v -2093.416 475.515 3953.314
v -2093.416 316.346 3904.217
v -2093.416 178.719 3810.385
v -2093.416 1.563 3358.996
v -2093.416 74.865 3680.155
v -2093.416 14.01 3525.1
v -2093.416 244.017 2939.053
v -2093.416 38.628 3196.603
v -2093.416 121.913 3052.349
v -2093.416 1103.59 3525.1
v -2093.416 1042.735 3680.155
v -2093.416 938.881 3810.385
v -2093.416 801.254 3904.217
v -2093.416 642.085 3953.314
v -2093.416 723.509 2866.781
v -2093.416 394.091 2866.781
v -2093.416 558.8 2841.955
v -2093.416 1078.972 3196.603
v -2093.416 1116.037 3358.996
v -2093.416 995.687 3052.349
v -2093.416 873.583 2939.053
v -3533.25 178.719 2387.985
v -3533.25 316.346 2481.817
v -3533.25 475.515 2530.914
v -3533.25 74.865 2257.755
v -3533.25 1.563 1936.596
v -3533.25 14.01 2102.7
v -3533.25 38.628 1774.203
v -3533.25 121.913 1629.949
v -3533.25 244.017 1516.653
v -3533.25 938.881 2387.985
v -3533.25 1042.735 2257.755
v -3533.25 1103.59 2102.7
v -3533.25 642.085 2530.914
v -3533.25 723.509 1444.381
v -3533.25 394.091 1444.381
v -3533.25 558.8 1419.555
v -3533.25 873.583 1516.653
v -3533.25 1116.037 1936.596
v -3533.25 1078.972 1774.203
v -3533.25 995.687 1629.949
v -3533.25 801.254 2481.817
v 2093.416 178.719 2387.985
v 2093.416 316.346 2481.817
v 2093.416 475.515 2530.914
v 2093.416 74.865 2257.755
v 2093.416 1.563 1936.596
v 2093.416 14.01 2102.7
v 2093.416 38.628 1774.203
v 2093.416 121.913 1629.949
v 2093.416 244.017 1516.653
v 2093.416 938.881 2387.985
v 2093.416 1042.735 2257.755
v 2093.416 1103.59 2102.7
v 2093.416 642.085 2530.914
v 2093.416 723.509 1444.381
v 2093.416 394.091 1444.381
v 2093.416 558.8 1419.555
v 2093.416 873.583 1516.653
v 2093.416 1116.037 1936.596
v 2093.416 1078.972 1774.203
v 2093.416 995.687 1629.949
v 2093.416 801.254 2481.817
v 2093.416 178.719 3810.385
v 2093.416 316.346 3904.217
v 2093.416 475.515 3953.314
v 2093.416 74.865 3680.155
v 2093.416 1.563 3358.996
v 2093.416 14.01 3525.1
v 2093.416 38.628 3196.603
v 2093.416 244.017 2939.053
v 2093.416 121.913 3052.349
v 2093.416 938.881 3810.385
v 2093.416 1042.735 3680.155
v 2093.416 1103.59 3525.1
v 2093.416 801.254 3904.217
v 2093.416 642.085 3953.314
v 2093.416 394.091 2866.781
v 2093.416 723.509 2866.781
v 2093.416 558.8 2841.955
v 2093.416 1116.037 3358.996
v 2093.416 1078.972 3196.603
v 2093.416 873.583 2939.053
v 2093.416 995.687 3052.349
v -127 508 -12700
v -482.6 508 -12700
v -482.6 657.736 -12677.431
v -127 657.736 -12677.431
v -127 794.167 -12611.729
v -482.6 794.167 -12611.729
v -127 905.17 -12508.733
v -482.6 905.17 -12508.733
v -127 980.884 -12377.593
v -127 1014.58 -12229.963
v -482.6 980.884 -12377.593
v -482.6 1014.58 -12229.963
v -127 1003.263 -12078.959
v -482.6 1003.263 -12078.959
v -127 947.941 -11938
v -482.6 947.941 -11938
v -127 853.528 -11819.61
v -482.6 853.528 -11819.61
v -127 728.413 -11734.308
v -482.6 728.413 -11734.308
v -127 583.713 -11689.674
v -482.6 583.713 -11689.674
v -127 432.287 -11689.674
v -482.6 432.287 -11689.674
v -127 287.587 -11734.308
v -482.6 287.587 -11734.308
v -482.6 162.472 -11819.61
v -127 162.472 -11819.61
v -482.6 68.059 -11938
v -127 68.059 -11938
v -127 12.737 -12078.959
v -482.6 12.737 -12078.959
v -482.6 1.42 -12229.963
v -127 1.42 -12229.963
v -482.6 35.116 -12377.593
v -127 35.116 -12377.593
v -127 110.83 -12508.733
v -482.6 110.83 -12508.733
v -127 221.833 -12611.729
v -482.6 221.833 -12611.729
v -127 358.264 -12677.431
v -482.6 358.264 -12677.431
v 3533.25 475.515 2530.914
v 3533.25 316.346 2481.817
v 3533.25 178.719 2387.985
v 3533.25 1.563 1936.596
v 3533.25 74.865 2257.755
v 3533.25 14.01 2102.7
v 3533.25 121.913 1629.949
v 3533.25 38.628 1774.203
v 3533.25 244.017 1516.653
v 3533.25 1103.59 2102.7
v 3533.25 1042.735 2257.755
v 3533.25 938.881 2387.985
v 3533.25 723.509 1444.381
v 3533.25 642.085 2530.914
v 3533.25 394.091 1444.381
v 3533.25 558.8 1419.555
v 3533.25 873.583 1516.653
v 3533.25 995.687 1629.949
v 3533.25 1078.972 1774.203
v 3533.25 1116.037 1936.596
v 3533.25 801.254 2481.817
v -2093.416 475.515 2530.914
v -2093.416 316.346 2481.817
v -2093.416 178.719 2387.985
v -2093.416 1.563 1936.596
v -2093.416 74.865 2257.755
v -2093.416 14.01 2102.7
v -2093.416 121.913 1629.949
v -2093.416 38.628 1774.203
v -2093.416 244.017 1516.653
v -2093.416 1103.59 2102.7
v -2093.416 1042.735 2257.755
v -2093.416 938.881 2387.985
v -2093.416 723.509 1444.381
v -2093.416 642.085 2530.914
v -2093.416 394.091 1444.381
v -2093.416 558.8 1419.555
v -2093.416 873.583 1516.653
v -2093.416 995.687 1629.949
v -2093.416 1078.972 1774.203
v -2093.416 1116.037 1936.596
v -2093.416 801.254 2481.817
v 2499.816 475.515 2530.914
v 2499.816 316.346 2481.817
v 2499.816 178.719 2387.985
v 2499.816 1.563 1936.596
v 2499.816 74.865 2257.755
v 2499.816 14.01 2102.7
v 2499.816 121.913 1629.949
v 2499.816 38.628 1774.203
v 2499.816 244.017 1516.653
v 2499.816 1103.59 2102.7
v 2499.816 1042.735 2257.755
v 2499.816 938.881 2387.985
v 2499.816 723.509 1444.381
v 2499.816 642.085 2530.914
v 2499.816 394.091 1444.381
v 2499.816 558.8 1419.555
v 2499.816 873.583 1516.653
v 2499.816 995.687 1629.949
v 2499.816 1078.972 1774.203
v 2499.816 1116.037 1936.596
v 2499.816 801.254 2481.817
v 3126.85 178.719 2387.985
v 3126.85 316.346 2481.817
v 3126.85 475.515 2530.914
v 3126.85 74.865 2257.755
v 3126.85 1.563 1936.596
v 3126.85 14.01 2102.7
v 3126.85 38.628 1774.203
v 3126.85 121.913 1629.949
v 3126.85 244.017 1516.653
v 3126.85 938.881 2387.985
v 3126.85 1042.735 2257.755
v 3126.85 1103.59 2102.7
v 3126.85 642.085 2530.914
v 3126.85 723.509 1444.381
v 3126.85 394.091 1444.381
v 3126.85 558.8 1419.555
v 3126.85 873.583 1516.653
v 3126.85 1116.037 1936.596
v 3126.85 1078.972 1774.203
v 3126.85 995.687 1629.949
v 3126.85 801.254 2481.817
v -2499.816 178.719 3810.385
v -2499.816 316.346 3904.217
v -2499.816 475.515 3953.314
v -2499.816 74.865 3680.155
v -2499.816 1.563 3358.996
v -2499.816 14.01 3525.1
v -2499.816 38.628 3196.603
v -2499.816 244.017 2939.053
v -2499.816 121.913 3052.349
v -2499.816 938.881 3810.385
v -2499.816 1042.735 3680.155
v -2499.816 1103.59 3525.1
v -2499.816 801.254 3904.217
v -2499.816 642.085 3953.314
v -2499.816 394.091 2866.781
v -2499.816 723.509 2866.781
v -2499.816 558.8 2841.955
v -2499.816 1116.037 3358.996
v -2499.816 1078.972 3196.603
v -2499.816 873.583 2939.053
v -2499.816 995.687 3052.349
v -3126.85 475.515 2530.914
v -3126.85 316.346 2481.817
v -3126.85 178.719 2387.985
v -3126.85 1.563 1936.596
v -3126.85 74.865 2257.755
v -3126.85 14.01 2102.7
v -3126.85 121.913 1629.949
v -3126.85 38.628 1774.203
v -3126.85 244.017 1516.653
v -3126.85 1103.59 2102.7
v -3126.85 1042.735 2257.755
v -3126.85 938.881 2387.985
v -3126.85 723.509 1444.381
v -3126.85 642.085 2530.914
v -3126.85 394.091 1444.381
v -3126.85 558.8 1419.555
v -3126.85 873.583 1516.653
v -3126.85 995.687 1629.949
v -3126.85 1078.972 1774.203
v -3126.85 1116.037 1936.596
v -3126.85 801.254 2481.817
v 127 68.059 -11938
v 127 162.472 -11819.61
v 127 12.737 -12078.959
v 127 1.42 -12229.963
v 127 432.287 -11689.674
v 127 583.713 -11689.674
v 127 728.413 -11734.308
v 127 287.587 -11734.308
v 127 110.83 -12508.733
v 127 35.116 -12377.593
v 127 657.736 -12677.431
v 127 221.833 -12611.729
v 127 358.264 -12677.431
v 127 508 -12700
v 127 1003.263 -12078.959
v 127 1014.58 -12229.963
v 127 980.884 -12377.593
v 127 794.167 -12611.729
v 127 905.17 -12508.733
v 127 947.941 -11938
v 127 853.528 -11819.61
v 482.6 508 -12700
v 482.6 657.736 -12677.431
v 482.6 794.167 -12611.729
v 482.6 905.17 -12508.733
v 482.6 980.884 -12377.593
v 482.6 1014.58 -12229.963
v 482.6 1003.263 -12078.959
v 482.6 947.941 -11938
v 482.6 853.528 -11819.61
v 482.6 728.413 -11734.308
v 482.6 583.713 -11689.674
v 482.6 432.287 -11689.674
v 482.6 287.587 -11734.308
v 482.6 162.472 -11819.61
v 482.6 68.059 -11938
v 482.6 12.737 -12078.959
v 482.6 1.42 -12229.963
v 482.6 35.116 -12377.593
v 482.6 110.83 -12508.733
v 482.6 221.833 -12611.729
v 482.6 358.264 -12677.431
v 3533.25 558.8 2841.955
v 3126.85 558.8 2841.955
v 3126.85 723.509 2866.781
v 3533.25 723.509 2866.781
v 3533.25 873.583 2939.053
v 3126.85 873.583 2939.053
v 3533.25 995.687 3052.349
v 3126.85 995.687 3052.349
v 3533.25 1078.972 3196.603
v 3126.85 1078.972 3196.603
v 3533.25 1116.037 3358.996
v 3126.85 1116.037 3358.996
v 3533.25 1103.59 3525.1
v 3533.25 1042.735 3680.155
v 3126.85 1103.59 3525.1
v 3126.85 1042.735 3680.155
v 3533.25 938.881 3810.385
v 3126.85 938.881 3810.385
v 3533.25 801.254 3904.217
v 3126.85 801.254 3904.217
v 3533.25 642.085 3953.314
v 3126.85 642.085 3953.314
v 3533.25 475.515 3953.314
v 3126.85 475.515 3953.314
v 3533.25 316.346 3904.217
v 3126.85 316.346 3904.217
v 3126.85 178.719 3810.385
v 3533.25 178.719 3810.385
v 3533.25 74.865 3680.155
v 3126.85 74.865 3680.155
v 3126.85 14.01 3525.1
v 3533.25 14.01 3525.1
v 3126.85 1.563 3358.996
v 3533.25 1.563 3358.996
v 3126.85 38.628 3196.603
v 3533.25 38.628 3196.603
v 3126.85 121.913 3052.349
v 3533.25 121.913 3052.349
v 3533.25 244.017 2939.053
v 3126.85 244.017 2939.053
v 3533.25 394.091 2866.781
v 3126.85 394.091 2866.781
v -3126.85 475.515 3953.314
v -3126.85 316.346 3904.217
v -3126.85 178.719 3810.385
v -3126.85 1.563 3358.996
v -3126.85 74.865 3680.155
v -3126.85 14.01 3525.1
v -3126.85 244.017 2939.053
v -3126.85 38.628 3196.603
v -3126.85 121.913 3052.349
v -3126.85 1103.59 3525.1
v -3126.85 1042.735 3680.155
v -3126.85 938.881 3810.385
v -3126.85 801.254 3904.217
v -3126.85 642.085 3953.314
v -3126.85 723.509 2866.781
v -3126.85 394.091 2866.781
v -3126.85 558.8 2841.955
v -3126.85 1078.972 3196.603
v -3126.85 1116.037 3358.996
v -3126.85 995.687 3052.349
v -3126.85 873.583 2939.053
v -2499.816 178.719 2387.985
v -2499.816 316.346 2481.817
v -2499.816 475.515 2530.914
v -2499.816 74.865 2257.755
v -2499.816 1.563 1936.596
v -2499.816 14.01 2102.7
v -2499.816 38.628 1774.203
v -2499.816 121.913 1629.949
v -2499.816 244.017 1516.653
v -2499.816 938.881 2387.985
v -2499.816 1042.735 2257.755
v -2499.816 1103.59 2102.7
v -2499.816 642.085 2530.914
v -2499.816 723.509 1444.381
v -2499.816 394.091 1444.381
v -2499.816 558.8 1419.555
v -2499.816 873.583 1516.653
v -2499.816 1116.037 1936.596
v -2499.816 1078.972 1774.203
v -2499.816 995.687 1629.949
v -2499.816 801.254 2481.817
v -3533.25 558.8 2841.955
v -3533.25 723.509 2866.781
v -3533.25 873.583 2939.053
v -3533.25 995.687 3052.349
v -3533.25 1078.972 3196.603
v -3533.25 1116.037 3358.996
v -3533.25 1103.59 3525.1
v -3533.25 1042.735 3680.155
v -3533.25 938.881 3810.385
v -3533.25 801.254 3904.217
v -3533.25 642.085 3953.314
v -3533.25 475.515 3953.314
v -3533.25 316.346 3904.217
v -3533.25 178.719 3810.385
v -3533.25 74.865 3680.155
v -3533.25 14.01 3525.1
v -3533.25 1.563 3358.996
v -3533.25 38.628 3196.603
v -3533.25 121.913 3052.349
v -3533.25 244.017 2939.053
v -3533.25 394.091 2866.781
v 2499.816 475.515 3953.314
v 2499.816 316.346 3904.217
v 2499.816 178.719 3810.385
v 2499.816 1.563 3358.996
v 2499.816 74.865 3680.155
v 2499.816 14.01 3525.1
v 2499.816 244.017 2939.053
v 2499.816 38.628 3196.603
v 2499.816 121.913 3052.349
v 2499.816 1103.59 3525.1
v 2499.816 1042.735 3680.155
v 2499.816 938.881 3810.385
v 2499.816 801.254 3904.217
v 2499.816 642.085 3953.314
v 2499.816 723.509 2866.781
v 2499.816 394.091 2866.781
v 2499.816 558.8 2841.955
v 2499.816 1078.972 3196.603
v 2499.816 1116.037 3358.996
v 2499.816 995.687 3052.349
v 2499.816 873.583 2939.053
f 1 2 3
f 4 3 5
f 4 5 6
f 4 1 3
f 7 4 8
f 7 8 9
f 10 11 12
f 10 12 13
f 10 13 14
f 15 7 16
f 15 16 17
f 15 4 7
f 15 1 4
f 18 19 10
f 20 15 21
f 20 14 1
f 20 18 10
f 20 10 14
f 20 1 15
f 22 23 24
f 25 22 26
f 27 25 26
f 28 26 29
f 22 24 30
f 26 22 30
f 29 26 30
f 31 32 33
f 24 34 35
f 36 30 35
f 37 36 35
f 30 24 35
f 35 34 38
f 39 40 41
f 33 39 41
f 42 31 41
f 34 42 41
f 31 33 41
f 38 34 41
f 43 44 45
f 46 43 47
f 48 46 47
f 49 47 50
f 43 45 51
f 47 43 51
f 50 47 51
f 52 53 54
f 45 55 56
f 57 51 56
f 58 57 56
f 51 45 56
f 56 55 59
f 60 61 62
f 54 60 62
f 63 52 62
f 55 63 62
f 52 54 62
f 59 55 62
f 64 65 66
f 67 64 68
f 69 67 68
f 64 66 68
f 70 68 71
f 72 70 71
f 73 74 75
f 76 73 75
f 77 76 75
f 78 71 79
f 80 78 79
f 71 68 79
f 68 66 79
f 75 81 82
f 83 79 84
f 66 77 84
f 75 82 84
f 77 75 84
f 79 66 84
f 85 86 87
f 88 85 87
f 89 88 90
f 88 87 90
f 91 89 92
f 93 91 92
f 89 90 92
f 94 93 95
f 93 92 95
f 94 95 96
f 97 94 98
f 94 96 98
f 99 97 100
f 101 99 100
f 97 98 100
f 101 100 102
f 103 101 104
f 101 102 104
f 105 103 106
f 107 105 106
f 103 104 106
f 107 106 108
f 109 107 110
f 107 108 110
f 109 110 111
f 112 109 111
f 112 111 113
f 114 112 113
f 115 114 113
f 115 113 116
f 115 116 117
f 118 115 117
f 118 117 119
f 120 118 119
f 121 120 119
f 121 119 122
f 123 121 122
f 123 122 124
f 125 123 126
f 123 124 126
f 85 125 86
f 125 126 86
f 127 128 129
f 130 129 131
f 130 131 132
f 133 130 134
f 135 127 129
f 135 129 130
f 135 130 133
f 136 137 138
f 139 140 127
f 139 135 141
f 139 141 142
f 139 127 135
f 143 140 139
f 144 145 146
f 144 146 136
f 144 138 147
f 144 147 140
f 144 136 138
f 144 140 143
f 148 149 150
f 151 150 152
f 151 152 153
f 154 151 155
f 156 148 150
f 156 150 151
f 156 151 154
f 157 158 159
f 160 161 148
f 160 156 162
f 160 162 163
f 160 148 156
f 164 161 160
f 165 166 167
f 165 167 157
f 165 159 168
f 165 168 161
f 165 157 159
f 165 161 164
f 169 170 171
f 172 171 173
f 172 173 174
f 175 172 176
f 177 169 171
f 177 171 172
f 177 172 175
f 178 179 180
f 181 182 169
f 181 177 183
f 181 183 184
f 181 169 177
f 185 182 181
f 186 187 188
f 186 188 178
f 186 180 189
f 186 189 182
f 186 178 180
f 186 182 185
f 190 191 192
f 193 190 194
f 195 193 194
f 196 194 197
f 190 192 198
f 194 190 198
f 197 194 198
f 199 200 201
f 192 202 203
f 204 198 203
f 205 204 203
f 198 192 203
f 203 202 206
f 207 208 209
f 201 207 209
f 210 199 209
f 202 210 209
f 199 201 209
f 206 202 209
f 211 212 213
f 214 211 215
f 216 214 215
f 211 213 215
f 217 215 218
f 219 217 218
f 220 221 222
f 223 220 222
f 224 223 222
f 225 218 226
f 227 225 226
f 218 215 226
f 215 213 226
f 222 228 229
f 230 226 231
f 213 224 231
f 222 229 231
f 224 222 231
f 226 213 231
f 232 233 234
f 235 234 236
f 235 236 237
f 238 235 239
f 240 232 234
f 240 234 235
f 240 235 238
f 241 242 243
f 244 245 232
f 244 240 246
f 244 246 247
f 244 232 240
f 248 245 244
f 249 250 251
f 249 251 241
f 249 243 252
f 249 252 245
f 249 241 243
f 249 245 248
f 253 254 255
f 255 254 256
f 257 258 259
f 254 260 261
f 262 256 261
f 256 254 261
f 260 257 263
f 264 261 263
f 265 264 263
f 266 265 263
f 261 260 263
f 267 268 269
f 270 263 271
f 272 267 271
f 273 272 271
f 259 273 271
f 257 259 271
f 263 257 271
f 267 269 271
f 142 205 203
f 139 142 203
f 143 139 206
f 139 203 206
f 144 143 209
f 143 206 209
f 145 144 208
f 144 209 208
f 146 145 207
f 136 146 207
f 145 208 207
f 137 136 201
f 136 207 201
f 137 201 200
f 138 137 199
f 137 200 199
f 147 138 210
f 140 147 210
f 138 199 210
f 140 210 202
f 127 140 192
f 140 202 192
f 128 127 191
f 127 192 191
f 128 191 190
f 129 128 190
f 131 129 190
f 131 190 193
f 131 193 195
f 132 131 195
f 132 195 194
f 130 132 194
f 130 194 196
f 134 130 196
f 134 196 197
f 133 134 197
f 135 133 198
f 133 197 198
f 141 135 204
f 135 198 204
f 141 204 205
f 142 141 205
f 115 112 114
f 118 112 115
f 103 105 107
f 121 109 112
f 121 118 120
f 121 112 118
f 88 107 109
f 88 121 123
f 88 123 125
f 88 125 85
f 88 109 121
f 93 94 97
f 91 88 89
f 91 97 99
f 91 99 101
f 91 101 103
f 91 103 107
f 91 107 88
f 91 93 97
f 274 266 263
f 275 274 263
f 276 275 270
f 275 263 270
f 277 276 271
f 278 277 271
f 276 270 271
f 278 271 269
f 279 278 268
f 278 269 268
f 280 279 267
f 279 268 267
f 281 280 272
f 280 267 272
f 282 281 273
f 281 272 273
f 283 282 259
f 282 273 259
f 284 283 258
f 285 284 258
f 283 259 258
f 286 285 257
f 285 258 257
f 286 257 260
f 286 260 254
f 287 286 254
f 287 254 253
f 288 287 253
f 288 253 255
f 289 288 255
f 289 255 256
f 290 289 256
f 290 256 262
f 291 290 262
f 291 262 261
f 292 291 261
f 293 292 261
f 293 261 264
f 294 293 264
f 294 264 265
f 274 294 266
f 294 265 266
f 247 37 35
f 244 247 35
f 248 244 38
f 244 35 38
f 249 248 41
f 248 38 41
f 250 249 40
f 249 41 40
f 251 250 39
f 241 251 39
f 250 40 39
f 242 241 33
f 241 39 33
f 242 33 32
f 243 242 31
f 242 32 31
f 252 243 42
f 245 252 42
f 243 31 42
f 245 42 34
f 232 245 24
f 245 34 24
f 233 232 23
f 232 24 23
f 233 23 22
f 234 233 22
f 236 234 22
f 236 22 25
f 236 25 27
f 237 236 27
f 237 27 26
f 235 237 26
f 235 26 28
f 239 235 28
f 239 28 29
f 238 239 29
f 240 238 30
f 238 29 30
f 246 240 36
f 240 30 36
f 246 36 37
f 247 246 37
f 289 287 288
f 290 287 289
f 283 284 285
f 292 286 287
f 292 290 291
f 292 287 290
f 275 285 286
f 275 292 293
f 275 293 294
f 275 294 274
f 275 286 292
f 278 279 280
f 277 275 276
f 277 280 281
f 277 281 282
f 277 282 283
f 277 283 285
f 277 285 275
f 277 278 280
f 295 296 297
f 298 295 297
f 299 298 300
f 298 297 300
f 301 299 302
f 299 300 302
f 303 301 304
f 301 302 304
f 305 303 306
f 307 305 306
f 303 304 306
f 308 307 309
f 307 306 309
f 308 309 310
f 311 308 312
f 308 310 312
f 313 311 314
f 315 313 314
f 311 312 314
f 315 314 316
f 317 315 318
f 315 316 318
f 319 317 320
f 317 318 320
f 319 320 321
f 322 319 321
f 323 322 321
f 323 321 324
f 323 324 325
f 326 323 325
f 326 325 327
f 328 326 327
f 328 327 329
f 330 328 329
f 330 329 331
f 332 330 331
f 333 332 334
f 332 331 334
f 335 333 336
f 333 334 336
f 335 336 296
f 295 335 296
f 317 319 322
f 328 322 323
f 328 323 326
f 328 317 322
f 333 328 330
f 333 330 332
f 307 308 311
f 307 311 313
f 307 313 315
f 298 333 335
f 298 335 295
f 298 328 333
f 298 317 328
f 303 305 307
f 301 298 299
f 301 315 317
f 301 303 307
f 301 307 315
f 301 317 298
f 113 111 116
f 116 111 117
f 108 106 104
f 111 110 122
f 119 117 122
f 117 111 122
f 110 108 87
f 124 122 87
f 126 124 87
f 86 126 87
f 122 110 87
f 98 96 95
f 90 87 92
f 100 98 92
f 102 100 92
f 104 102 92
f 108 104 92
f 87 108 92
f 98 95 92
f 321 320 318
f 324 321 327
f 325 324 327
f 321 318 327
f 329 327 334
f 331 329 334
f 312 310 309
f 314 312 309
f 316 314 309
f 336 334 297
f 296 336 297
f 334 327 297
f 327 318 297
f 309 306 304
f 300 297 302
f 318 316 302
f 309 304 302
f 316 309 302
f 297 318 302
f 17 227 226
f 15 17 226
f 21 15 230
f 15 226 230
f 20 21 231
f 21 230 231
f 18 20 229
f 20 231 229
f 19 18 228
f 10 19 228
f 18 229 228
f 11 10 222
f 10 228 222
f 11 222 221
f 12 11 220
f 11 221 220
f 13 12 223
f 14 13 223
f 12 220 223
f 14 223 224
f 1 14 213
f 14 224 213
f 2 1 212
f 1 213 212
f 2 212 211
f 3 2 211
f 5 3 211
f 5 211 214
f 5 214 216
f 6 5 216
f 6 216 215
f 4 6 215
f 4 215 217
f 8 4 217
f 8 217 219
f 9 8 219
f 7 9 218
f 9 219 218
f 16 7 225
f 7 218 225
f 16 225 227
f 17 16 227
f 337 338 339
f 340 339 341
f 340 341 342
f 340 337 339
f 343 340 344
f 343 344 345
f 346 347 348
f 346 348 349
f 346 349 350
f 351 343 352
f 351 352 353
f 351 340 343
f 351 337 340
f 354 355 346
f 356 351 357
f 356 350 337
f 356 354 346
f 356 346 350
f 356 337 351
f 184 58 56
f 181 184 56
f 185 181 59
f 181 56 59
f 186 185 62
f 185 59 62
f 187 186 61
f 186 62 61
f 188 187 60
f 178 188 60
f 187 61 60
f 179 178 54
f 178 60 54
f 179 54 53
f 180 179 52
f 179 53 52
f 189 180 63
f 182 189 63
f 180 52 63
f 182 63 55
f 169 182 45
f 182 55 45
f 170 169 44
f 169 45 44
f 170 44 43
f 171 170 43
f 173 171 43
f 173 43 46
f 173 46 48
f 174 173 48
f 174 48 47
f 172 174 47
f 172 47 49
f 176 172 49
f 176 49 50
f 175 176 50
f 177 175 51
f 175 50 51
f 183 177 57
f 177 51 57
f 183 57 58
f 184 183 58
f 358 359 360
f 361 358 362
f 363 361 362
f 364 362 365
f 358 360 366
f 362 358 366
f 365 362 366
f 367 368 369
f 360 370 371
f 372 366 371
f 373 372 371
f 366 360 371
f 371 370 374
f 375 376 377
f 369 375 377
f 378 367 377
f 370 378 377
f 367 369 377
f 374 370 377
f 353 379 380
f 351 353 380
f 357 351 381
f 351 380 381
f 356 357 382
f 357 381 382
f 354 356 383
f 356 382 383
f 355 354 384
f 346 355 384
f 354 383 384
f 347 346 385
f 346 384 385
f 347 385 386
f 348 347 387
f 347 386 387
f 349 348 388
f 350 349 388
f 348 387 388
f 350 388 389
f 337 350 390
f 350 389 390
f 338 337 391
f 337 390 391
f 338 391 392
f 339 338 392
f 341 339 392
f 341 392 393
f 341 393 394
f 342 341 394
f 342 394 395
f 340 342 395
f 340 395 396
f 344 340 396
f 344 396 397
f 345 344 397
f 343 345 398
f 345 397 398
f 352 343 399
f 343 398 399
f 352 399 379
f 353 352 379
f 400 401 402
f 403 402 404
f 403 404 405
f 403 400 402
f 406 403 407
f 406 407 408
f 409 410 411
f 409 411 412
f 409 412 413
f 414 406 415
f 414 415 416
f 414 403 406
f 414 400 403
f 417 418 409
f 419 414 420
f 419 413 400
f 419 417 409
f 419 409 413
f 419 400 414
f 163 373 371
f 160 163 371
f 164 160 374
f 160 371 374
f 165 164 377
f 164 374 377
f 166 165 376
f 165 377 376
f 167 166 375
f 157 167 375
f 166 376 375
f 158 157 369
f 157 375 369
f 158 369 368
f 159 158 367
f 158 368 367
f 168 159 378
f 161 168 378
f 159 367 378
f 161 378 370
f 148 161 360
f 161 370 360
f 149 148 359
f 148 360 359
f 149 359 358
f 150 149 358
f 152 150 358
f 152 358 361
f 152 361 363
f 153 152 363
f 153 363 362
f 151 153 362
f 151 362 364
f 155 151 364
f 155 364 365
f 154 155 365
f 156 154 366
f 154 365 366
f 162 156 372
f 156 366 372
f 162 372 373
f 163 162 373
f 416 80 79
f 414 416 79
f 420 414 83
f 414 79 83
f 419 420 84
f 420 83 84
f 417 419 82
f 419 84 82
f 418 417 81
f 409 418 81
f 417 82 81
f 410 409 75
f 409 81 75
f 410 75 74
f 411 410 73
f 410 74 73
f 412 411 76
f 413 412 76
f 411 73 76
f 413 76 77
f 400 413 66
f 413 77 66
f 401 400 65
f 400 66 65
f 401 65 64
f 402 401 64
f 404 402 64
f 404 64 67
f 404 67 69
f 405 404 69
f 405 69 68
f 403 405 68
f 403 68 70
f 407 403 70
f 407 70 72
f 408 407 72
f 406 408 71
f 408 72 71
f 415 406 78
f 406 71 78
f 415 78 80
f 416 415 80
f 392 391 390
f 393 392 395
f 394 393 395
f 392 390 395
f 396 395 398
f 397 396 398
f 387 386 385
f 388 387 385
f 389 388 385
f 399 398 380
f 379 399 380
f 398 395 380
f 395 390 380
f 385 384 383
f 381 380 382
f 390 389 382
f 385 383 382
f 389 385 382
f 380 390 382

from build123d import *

# Parameters (mm, degrees)
MAIN_TIRE_1_DEPTH        = 203.2
MAIN_TIRE_1_DEPTH_BACK   = 203.2
SKETCH9_R                = 558.8
MAIN_TIRE_1_2_DEPTH      = 203.2
MAIN_TIRE_1_2_DEPTH_BACK = 203.2
MAIN_TIRE_2_DEPTH        = 203.2
MAIN_TIRE_2_DEPTH_BACK   = 203.2
SKETCH10_R               = 558.8
MAIN_TIRE_2_2_DEPTH      = 203.2
MAIN_TIRE_2_2_DEPTH_BACK = 203.2
MAIN_TIRE_3_DEPTH        = 203.2
MAIN_TIRE_3_DEPTH_BACK   = 203.2
SKETCH12_R               = 558.8
MAIN_TIRE_3_2_DEPTH      = 203.2
MAIN_TIRE_3_2_DEPTH_BACK = 203.2
MAIN_TIRE_4_DEPTH        = 203.2
MAIN_TIRE_4_DEPTH_BACK   = 203.2
SKETCH13_R               = 558.8
MAIN_TIRE_4_2_DEPTH      = 203.2
MAIN_TIRE_4_2_DEPTH_BACK = 203.2
NOSE_TIRE_1_DEPTH        = 177.8
NOSE_TIRE_1_DEPTH_BACK   = 177.8
SKETCH14_R               = 508
NOSE_TIRE_2_DEPTH        = 177.8
NOSE_TIRE_2_DEPTH_BACK   = 177.8
SKETCH15_R               = 508


with BuildPart() as part:
    # Sketch9 → Main tire 1 (new, two sides: drawn at the far end of the back side and taken through both)
    with BuildSketch(Plane(origin=(-2296.616197494, 0, 0), x_dir=(0, 0, -1), z_dir=(1, 0, 0)).offset(-MAIN_TIRE_1_DEPTH_BACK)):
        with Locations((-3400.7552, 558.8)):
            Circle(SKETCH9_R)
    extrude(amount=MAIN_TIRE_1_DEPTH + MAIN_TIRE_1_DEPTH_BACK)


with BuildPart() as body_2:
    # Sketch9 → Main tire 1 2 (new, two sides: drawn at the far end of the back side and taken through both)
    with BuildSketch(Plane(origin=(-2296.616197494, 0, 0), x_dir=(0, 0, -1), z_dir=(1, 0, 0)).offset(-MAIN_TIRE_1_2_DEPTH_BACK)):
        with Locations((-1978.3552, 558.8)):
            Circle(SKETCH9_R)
    extrude(amount=MAIN_TIRE_1_2_DEPTH + MAIN_TIRE_1_2_DEPTH_BACK)


with BuildPart() as body_3:
    # Sketch10 → Main tire 2 (new, two sides: drawn at the far end of the back side and taken through both)
    with BuildSketch(Plane(origin=(-3330.050289329, 0, 0), x_dir=(0, 0, -1), z_dir=(1, 0, 0)).offset(-MAIN_TIRE_2_DEPTH_BACK)):
        with Locations((-3400.7552, 558.8)):
            Circle(SKETCH10_R)
    extrude(amount=MAIN_TIRE_2_DEPTH + MAIN_TIRE_2_DEPTH_BACK)


with BuildPart() as body_4:
    # Sketch10 → Main tire 2 2 (new, two sides: drawn at the far end of the back side and taken through both)
    with BuildSketch(Plane(origin=(-3330.050289329, 0, 0), x_dir=(0, 0, -1), z_dir=(1, 0, 0)).offset(-MAIN_TIRE_2_2_DEPTH_BACK)):
        with Locations((-1978.3552, 558.8)):
            Circle(SKETCH10_R)
    extrude(amount=MAIN_TIRE_2_2_DEPTH + MAIN_TIRE_2_2_DEPTH_BACK)


with BuildPart() as body_5:
    # Sketch12 → Main tire 3 (new, two sides: drawn at the far end of the back side and taken through both)
    with BuildSketch(Plane(origin=(2296.616197494, 0, 0), x_dir=(0, 0, -1), z_dir=(1, 0, 0)).offset(-MAIN_TIRE_3_DEPTH_BACK)):
        with Locations((-1978.3552, 558.8)):
            Circle(SKETCH12_R)
    extrude(amount=MAIN_TIRE_3_DEPTH + MAIN_TIRE_3_DEPTH_BACK)


with BuildPart() as body_6:
    # Sketch12 → Main tire 3 2 (new, two sides: drawn at the far end of the back side and taken through both)
    with BuildSketch(Plane(origin=(2296.616197494, 0, 0), x_dir=(0, 0, -1), z_dir=(1, 0, 0)).offset(-MAIN_TIRE_3_2_DEPTH_BACK)):
        with Locations((-3400.7552, 558.8)):
            Circle(SKETCH12_R)
    extrude(amount=MAIN_TIRE_3_2_DEPTH + MAIN_TIRE_3_2_DEPTH_BACK)


with BuildPart() as body_7:
    # Sketch13 → Main tire 4 (new, two sides: drawn at the far end of the back side and taken through both)
    with BuildSketch(Plane(origin=(3330.050289329, 0, 0), x_dir=(0, 0, -1), z_dir=(1, 0, 0)).offset(-MAIN_TIRE_4_DEPTH_BACK)):
        with Locations((-3400.7552, 558.8)):
            Circle(SKETCH13_R)
    extrude(amount=MAIN_TIRE_4_DEPTH + MAIN_TIRE_4_DEPTH_BACK)


with BuildPart() as body_8:
    # Sketch13 → Main tire 4 2 (new, two sides: drawn at the far end of the back side and taken through both)
    with BuildSketch(Plane(origin=(3330.050289329, 0, 0), x_dir=(0, 0, -1), z_dir=(1, 0, 0)).offset(-MAIN_TIRE_4_2_DEPTH_BACK)):
        with Locations((-1978.3552, 558.8)):
            Circle(SKETCH13_R)
    extrude(amount=MAIN_TIRE_4_2_DEPTH + MAIN_TIRE_4_2_DEPTH_BACK)


with BuildPart() as body_9:
    # Sketch14 → Nose tire 1 (new, two sides: drawn at the far end of the back side and taken through both)
    with BuildSketch(Plane(origin=(-304.8, 0, 0), x_dir=(0, 0, -1), z_dir=(1, 0, 0)).offset(-NOSE_TIRE_1_DEPTH_BACK)):
        with Locations((12192, 508)):
            Circle(SKETCH14_R)
    extrude(amount=NOSE_TIRE_1_DEPTH + NOSE_TIRE_1_DEPTH_BACK)


with BuildPart() as body_10:
    # Sketch15 → Nose tire 2 (new, two sides: drawn at the far end of the back side and taken through both)
    with BuildSketch(Plane(origin=(304.8, 0, 0), x_dir=(0, 0, -1), z_dir=(1, 0, 0)).offset(-NOSE_TIRE_2_DEPTH_BACK)):
        with Locations((12192, 508)):
            Circle(SKETCH15_R)
    extrude(amount=NOSE_TIRE_2_DEPTH + NOSE_TIRE_2_DEPTH_BACK)


solid = Compound([part.part, body_2.part, body_3.part, body_4.part, body_5.part, body_6.part, body_7.part, body_8.part, body_9.part, body_10.part])
